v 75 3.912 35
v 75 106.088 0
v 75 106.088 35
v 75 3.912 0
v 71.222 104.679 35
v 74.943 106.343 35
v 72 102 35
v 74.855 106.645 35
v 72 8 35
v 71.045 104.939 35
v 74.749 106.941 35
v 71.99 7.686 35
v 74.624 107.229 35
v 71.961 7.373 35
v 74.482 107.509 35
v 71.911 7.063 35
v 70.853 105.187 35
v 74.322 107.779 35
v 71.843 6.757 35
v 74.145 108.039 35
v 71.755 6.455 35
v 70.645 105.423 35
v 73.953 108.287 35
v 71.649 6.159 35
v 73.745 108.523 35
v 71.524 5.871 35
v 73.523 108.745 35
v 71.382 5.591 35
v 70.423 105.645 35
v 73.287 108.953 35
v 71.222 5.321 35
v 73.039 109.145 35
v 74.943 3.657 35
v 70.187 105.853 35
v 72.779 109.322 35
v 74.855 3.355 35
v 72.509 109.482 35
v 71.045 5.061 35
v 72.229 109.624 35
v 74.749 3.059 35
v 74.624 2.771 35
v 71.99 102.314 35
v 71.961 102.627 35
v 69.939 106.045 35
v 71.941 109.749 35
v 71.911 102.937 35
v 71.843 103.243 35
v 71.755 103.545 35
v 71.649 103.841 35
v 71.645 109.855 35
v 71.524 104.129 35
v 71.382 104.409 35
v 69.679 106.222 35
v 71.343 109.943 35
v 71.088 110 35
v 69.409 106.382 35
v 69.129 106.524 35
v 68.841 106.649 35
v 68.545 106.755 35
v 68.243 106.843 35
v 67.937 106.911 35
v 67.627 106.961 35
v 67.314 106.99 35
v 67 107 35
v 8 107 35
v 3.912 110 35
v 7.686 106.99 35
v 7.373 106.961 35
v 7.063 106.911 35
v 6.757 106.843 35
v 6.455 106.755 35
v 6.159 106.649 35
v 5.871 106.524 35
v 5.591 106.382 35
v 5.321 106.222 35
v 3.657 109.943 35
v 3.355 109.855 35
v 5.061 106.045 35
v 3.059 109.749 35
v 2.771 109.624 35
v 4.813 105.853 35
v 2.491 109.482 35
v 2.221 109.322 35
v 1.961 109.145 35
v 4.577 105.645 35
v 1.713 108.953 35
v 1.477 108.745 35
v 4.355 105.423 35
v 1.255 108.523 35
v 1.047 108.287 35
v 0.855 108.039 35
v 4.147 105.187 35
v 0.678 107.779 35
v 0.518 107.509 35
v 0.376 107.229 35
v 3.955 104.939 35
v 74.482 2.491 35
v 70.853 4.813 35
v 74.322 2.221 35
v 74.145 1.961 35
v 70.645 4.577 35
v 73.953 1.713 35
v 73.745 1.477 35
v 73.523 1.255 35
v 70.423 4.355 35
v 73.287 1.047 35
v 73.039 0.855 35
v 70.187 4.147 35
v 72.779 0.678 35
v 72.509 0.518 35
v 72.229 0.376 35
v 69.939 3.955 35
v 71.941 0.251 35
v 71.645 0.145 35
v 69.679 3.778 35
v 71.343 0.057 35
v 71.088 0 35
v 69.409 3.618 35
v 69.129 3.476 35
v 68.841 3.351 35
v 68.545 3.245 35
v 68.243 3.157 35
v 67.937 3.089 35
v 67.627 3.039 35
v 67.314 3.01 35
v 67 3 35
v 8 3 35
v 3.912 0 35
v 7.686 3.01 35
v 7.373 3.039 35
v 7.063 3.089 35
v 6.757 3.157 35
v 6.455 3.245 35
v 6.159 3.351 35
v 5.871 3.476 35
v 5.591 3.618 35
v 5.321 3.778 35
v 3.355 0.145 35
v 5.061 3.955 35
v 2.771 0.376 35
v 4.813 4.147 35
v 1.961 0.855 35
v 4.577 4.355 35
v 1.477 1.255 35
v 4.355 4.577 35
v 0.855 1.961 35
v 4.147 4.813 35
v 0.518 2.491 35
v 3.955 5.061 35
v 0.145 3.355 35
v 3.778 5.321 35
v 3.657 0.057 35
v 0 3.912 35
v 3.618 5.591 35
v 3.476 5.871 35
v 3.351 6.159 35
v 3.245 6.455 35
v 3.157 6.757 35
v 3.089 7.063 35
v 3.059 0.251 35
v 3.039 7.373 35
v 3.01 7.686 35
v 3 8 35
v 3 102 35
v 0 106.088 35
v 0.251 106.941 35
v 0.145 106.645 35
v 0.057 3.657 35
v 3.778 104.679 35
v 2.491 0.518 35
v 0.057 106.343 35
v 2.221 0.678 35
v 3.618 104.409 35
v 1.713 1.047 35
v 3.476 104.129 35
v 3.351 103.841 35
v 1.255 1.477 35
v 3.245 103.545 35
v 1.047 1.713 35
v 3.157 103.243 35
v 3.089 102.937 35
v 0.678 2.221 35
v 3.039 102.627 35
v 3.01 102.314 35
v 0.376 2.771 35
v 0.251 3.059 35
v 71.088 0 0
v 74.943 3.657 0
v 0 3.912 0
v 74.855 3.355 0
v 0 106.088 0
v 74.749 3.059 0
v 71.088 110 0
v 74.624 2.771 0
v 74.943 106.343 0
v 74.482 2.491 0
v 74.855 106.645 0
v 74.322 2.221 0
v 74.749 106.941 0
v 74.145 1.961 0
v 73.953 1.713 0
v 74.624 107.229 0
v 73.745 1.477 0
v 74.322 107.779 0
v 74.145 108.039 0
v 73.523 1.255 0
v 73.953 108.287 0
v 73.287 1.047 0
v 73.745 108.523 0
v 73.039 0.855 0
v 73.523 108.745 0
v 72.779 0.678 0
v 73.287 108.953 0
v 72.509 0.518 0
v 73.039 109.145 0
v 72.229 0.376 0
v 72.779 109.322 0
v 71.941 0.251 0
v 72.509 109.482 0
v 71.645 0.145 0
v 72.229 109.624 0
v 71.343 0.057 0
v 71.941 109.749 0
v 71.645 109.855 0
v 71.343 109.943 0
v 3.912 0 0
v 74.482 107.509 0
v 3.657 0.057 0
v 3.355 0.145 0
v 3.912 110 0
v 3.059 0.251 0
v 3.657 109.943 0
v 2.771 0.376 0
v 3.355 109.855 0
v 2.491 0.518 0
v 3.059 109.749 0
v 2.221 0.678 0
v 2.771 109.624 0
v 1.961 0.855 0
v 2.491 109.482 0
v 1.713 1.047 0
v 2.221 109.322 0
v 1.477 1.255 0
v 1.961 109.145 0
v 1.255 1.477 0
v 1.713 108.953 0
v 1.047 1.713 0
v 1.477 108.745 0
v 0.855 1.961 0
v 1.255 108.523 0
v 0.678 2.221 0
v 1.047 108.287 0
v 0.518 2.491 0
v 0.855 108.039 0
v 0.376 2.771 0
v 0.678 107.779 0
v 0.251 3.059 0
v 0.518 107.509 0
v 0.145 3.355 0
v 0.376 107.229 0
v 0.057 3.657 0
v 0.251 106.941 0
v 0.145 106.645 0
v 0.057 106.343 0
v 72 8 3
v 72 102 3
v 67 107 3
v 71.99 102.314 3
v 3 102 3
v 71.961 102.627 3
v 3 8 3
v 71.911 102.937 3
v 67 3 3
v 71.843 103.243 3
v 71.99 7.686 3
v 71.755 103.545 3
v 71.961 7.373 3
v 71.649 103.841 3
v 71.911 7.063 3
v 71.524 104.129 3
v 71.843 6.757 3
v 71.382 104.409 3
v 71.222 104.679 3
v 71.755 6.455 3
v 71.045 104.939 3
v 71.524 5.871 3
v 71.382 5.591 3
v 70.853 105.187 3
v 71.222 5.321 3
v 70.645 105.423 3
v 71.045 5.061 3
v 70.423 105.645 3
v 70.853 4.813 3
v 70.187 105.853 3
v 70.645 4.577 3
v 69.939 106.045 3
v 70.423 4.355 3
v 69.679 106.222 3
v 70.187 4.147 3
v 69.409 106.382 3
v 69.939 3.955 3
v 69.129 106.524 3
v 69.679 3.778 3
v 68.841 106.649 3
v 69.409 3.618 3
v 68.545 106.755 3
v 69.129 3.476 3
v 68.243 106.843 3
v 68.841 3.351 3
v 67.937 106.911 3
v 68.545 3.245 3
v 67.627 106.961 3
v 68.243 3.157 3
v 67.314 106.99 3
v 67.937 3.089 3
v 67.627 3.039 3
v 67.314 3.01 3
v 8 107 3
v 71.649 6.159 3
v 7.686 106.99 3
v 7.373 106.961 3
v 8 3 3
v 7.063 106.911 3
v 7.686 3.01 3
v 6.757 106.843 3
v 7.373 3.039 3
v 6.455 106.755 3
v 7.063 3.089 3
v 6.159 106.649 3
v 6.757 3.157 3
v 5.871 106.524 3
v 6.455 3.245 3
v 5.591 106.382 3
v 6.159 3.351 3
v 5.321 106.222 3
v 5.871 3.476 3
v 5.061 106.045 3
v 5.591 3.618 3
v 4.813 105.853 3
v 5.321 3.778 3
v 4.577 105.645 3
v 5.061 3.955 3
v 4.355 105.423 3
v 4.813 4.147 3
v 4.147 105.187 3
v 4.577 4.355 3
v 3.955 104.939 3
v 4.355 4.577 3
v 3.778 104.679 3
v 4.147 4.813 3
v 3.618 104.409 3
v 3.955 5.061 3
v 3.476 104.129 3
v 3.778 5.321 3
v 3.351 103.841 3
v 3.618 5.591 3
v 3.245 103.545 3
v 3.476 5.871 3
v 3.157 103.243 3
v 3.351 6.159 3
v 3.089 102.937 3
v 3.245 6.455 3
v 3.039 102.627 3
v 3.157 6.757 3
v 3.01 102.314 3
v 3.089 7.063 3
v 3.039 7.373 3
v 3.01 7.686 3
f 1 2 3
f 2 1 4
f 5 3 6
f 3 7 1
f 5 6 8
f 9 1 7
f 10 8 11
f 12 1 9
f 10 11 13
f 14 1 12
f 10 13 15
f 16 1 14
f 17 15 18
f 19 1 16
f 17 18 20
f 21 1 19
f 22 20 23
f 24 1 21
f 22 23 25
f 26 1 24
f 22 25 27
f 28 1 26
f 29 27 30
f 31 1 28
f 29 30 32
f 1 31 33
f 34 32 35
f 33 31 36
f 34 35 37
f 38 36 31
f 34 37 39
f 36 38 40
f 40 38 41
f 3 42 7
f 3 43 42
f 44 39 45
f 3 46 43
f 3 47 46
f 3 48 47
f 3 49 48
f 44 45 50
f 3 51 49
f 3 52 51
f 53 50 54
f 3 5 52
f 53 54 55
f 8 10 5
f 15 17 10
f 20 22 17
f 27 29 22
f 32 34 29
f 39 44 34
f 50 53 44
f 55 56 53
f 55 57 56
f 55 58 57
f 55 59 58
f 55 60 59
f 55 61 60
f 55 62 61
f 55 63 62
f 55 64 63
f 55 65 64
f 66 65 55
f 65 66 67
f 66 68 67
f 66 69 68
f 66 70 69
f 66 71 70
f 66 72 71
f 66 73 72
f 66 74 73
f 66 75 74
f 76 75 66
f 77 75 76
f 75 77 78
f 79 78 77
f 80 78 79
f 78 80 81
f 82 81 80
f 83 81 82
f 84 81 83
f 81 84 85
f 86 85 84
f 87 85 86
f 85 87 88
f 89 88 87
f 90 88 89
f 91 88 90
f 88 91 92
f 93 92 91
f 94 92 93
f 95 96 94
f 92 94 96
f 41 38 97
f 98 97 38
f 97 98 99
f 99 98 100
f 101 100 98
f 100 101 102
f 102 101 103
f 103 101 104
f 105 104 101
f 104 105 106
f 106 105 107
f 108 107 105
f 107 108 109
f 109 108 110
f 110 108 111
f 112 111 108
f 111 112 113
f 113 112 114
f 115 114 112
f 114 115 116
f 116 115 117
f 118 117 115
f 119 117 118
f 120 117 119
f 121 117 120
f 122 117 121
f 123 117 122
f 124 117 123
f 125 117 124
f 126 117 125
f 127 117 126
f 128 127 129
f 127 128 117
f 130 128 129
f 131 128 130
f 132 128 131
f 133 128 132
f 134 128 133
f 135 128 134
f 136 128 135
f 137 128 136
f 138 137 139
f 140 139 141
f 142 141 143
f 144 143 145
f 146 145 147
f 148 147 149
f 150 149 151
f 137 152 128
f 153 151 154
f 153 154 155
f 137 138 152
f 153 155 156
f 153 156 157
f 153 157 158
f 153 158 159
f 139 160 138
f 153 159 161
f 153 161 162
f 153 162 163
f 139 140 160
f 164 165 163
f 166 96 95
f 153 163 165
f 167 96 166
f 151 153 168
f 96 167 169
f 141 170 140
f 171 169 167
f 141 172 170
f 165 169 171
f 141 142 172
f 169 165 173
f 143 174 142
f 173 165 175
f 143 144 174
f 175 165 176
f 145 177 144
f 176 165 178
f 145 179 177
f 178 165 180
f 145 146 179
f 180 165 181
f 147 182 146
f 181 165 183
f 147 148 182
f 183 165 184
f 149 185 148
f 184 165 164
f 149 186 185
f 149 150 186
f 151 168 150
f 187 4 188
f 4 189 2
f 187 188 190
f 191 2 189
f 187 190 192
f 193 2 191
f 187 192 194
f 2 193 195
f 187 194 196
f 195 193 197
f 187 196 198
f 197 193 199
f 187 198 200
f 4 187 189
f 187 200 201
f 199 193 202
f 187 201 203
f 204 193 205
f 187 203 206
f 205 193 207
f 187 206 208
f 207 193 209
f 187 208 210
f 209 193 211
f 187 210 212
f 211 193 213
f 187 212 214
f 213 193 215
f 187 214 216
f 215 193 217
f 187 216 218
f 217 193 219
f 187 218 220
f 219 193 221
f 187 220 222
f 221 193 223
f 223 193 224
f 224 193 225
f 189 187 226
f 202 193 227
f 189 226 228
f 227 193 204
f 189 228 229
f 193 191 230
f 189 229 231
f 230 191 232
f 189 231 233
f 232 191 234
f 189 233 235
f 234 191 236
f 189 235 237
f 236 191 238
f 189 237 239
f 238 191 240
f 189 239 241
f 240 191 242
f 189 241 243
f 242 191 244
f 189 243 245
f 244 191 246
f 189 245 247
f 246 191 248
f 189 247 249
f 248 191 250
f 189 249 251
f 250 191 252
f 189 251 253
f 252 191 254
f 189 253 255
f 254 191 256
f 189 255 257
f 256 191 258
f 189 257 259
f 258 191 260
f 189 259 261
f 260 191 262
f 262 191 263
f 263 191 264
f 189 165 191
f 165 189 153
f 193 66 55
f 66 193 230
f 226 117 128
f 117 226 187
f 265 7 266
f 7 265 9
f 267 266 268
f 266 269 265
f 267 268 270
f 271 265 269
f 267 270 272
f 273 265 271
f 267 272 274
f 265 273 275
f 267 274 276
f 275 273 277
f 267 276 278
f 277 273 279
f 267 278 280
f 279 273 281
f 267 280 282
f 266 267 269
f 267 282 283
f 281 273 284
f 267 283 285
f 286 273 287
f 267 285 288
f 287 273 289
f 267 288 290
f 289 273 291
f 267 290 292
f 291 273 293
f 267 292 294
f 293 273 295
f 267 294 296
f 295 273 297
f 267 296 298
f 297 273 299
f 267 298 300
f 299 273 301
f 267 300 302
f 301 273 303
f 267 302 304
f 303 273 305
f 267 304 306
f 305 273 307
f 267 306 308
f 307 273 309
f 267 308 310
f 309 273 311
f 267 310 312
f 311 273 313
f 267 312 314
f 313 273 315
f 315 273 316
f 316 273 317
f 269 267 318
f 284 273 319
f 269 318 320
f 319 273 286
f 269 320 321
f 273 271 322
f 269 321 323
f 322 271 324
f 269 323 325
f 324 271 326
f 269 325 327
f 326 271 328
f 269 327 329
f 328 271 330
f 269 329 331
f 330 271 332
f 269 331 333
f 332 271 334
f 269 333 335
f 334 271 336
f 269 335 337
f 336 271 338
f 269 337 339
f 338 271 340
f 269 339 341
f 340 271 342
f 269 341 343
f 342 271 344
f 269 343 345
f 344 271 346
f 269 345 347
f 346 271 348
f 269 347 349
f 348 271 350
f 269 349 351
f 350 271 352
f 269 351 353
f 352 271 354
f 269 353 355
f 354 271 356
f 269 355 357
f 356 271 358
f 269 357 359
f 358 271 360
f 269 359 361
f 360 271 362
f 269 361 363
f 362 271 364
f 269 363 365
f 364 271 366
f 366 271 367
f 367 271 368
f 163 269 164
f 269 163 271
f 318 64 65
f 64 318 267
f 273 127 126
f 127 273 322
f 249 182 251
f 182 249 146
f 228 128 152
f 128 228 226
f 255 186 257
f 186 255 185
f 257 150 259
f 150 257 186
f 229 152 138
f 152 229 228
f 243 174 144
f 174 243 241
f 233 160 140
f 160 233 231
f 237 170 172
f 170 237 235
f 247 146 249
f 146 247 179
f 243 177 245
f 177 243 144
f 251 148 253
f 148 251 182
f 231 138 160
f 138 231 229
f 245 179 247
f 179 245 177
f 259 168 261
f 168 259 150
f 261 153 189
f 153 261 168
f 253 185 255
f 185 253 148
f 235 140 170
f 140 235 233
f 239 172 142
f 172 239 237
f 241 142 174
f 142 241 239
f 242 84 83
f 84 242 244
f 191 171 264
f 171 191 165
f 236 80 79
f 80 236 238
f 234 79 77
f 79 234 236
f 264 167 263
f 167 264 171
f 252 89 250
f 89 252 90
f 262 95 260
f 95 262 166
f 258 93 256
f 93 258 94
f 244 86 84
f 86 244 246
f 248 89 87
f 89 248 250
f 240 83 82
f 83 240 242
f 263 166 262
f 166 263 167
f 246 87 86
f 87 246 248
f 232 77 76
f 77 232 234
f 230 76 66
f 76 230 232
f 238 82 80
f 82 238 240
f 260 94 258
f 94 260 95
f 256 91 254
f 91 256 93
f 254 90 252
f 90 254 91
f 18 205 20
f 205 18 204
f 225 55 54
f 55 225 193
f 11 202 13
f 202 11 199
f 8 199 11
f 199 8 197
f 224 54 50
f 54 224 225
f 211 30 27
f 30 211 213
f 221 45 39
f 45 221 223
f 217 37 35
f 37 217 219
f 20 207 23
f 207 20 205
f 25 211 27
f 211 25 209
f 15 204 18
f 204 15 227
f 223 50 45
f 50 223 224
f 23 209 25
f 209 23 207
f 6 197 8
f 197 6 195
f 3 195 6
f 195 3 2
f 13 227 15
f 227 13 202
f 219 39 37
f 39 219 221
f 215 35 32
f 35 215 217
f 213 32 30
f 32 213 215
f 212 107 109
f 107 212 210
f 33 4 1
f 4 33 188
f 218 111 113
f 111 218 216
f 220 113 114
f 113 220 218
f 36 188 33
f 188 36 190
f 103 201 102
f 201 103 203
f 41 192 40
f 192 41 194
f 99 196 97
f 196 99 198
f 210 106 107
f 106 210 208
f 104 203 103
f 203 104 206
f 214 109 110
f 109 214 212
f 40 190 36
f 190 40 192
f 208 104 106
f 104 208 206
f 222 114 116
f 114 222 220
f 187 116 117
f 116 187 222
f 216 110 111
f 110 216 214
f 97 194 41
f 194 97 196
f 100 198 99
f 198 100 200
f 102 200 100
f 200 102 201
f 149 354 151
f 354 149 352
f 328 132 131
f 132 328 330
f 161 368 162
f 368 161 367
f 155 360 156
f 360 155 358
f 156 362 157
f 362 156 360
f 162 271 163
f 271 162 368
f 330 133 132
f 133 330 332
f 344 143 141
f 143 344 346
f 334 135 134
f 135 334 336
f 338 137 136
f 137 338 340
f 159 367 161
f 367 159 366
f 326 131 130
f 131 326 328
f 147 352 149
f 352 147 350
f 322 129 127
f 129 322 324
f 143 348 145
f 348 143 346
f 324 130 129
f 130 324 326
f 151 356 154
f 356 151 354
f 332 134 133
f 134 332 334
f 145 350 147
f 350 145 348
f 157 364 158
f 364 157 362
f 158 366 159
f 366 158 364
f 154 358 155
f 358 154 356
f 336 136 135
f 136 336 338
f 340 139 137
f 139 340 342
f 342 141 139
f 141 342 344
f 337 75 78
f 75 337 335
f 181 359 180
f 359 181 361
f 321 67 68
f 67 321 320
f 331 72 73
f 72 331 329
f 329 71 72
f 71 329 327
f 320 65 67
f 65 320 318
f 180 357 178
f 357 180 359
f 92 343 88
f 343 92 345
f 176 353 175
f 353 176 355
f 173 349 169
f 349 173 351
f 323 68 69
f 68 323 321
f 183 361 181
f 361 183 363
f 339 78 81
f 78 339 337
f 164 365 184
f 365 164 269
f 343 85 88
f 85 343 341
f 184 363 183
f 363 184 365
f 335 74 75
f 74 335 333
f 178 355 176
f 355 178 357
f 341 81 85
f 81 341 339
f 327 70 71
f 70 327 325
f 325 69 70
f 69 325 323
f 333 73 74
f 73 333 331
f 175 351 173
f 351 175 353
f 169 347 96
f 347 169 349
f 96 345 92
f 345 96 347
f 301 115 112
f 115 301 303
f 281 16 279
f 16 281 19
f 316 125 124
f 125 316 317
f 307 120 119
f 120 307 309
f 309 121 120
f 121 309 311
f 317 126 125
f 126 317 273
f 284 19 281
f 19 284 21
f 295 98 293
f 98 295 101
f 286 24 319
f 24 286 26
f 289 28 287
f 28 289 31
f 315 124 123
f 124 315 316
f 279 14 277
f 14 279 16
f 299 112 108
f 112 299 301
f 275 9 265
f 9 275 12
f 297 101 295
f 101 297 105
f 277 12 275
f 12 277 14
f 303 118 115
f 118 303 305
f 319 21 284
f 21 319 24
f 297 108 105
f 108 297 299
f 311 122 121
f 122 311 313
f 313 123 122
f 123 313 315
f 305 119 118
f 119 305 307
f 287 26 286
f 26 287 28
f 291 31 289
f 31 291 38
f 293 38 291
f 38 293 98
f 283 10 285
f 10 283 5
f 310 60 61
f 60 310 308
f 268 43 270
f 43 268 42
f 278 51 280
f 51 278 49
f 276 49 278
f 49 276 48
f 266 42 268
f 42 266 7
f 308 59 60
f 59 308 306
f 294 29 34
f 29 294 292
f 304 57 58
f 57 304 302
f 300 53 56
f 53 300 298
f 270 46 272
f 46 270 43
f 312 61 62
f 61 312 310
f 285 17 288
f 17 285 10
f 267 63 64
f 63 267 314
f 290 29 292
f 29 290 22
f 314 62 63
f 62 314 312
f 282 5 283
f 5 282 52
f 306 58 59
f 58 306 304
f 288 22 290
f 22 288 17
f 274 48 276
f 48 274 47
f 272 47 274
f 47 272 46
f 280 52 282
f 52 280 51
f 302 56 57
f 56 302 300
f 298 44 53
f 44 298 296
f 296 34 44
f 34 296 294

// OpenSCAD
/*
 * file: simple-box.scad
 * author: gregor binder <gregor_reprap@catrix.at>
 * date: 09.12.2013
 * last change: 09.12.2013
 * license: CC BY-NC-SA 4.0
 */

width=75;
length=110;
thickness=3;
height=35;
radius=5;
$fn=100;

/****************/

module inner_radius(h) {
	translate([radius,radius,0])
	difference() {
		translate([-radius,-radius,0])
			cube([radius,radius,h]);
		translate([0,0,-0.1])
			cylinder(h=h-thickness+5,r=radius);
	}
}

module corpus() {
	difference() {
		cube([width,length,height]);
		translate([thickness,thickness,thickness])
			cube([width-thickness*2,length-thickness*2,height+5]);
	}
}

difference() {
	corpus();
	translate([-0.1,-0.1,-0.1])
		inner_radius(height+5);
	translate([-0.1,length+0.1,-0.1])
		rotate([0,0,-90])
			inner_radius(height+5);
	translate([width+0.1,length+0.1,-0.1])
		rotate([0,0,180])
			inner_radius(height+5);
	translate([width+0.1,-0.1,-0.1])
		rotate([0,0,90])
			inner_radius(height+5);
}

translate([thickness,thickness,0])
	inner_radius(height);
translate([thickness,length-thickness,0])
	rotate([0,0,-90])
		inner_radius(height);
translate([width-thickness,thickness,0])
	rotate([0,0,90])
		inner_radius(height);
translate([width-thickness,length-thickness,0])
	rotate([0,0,-180])
		inner_radius(height);
